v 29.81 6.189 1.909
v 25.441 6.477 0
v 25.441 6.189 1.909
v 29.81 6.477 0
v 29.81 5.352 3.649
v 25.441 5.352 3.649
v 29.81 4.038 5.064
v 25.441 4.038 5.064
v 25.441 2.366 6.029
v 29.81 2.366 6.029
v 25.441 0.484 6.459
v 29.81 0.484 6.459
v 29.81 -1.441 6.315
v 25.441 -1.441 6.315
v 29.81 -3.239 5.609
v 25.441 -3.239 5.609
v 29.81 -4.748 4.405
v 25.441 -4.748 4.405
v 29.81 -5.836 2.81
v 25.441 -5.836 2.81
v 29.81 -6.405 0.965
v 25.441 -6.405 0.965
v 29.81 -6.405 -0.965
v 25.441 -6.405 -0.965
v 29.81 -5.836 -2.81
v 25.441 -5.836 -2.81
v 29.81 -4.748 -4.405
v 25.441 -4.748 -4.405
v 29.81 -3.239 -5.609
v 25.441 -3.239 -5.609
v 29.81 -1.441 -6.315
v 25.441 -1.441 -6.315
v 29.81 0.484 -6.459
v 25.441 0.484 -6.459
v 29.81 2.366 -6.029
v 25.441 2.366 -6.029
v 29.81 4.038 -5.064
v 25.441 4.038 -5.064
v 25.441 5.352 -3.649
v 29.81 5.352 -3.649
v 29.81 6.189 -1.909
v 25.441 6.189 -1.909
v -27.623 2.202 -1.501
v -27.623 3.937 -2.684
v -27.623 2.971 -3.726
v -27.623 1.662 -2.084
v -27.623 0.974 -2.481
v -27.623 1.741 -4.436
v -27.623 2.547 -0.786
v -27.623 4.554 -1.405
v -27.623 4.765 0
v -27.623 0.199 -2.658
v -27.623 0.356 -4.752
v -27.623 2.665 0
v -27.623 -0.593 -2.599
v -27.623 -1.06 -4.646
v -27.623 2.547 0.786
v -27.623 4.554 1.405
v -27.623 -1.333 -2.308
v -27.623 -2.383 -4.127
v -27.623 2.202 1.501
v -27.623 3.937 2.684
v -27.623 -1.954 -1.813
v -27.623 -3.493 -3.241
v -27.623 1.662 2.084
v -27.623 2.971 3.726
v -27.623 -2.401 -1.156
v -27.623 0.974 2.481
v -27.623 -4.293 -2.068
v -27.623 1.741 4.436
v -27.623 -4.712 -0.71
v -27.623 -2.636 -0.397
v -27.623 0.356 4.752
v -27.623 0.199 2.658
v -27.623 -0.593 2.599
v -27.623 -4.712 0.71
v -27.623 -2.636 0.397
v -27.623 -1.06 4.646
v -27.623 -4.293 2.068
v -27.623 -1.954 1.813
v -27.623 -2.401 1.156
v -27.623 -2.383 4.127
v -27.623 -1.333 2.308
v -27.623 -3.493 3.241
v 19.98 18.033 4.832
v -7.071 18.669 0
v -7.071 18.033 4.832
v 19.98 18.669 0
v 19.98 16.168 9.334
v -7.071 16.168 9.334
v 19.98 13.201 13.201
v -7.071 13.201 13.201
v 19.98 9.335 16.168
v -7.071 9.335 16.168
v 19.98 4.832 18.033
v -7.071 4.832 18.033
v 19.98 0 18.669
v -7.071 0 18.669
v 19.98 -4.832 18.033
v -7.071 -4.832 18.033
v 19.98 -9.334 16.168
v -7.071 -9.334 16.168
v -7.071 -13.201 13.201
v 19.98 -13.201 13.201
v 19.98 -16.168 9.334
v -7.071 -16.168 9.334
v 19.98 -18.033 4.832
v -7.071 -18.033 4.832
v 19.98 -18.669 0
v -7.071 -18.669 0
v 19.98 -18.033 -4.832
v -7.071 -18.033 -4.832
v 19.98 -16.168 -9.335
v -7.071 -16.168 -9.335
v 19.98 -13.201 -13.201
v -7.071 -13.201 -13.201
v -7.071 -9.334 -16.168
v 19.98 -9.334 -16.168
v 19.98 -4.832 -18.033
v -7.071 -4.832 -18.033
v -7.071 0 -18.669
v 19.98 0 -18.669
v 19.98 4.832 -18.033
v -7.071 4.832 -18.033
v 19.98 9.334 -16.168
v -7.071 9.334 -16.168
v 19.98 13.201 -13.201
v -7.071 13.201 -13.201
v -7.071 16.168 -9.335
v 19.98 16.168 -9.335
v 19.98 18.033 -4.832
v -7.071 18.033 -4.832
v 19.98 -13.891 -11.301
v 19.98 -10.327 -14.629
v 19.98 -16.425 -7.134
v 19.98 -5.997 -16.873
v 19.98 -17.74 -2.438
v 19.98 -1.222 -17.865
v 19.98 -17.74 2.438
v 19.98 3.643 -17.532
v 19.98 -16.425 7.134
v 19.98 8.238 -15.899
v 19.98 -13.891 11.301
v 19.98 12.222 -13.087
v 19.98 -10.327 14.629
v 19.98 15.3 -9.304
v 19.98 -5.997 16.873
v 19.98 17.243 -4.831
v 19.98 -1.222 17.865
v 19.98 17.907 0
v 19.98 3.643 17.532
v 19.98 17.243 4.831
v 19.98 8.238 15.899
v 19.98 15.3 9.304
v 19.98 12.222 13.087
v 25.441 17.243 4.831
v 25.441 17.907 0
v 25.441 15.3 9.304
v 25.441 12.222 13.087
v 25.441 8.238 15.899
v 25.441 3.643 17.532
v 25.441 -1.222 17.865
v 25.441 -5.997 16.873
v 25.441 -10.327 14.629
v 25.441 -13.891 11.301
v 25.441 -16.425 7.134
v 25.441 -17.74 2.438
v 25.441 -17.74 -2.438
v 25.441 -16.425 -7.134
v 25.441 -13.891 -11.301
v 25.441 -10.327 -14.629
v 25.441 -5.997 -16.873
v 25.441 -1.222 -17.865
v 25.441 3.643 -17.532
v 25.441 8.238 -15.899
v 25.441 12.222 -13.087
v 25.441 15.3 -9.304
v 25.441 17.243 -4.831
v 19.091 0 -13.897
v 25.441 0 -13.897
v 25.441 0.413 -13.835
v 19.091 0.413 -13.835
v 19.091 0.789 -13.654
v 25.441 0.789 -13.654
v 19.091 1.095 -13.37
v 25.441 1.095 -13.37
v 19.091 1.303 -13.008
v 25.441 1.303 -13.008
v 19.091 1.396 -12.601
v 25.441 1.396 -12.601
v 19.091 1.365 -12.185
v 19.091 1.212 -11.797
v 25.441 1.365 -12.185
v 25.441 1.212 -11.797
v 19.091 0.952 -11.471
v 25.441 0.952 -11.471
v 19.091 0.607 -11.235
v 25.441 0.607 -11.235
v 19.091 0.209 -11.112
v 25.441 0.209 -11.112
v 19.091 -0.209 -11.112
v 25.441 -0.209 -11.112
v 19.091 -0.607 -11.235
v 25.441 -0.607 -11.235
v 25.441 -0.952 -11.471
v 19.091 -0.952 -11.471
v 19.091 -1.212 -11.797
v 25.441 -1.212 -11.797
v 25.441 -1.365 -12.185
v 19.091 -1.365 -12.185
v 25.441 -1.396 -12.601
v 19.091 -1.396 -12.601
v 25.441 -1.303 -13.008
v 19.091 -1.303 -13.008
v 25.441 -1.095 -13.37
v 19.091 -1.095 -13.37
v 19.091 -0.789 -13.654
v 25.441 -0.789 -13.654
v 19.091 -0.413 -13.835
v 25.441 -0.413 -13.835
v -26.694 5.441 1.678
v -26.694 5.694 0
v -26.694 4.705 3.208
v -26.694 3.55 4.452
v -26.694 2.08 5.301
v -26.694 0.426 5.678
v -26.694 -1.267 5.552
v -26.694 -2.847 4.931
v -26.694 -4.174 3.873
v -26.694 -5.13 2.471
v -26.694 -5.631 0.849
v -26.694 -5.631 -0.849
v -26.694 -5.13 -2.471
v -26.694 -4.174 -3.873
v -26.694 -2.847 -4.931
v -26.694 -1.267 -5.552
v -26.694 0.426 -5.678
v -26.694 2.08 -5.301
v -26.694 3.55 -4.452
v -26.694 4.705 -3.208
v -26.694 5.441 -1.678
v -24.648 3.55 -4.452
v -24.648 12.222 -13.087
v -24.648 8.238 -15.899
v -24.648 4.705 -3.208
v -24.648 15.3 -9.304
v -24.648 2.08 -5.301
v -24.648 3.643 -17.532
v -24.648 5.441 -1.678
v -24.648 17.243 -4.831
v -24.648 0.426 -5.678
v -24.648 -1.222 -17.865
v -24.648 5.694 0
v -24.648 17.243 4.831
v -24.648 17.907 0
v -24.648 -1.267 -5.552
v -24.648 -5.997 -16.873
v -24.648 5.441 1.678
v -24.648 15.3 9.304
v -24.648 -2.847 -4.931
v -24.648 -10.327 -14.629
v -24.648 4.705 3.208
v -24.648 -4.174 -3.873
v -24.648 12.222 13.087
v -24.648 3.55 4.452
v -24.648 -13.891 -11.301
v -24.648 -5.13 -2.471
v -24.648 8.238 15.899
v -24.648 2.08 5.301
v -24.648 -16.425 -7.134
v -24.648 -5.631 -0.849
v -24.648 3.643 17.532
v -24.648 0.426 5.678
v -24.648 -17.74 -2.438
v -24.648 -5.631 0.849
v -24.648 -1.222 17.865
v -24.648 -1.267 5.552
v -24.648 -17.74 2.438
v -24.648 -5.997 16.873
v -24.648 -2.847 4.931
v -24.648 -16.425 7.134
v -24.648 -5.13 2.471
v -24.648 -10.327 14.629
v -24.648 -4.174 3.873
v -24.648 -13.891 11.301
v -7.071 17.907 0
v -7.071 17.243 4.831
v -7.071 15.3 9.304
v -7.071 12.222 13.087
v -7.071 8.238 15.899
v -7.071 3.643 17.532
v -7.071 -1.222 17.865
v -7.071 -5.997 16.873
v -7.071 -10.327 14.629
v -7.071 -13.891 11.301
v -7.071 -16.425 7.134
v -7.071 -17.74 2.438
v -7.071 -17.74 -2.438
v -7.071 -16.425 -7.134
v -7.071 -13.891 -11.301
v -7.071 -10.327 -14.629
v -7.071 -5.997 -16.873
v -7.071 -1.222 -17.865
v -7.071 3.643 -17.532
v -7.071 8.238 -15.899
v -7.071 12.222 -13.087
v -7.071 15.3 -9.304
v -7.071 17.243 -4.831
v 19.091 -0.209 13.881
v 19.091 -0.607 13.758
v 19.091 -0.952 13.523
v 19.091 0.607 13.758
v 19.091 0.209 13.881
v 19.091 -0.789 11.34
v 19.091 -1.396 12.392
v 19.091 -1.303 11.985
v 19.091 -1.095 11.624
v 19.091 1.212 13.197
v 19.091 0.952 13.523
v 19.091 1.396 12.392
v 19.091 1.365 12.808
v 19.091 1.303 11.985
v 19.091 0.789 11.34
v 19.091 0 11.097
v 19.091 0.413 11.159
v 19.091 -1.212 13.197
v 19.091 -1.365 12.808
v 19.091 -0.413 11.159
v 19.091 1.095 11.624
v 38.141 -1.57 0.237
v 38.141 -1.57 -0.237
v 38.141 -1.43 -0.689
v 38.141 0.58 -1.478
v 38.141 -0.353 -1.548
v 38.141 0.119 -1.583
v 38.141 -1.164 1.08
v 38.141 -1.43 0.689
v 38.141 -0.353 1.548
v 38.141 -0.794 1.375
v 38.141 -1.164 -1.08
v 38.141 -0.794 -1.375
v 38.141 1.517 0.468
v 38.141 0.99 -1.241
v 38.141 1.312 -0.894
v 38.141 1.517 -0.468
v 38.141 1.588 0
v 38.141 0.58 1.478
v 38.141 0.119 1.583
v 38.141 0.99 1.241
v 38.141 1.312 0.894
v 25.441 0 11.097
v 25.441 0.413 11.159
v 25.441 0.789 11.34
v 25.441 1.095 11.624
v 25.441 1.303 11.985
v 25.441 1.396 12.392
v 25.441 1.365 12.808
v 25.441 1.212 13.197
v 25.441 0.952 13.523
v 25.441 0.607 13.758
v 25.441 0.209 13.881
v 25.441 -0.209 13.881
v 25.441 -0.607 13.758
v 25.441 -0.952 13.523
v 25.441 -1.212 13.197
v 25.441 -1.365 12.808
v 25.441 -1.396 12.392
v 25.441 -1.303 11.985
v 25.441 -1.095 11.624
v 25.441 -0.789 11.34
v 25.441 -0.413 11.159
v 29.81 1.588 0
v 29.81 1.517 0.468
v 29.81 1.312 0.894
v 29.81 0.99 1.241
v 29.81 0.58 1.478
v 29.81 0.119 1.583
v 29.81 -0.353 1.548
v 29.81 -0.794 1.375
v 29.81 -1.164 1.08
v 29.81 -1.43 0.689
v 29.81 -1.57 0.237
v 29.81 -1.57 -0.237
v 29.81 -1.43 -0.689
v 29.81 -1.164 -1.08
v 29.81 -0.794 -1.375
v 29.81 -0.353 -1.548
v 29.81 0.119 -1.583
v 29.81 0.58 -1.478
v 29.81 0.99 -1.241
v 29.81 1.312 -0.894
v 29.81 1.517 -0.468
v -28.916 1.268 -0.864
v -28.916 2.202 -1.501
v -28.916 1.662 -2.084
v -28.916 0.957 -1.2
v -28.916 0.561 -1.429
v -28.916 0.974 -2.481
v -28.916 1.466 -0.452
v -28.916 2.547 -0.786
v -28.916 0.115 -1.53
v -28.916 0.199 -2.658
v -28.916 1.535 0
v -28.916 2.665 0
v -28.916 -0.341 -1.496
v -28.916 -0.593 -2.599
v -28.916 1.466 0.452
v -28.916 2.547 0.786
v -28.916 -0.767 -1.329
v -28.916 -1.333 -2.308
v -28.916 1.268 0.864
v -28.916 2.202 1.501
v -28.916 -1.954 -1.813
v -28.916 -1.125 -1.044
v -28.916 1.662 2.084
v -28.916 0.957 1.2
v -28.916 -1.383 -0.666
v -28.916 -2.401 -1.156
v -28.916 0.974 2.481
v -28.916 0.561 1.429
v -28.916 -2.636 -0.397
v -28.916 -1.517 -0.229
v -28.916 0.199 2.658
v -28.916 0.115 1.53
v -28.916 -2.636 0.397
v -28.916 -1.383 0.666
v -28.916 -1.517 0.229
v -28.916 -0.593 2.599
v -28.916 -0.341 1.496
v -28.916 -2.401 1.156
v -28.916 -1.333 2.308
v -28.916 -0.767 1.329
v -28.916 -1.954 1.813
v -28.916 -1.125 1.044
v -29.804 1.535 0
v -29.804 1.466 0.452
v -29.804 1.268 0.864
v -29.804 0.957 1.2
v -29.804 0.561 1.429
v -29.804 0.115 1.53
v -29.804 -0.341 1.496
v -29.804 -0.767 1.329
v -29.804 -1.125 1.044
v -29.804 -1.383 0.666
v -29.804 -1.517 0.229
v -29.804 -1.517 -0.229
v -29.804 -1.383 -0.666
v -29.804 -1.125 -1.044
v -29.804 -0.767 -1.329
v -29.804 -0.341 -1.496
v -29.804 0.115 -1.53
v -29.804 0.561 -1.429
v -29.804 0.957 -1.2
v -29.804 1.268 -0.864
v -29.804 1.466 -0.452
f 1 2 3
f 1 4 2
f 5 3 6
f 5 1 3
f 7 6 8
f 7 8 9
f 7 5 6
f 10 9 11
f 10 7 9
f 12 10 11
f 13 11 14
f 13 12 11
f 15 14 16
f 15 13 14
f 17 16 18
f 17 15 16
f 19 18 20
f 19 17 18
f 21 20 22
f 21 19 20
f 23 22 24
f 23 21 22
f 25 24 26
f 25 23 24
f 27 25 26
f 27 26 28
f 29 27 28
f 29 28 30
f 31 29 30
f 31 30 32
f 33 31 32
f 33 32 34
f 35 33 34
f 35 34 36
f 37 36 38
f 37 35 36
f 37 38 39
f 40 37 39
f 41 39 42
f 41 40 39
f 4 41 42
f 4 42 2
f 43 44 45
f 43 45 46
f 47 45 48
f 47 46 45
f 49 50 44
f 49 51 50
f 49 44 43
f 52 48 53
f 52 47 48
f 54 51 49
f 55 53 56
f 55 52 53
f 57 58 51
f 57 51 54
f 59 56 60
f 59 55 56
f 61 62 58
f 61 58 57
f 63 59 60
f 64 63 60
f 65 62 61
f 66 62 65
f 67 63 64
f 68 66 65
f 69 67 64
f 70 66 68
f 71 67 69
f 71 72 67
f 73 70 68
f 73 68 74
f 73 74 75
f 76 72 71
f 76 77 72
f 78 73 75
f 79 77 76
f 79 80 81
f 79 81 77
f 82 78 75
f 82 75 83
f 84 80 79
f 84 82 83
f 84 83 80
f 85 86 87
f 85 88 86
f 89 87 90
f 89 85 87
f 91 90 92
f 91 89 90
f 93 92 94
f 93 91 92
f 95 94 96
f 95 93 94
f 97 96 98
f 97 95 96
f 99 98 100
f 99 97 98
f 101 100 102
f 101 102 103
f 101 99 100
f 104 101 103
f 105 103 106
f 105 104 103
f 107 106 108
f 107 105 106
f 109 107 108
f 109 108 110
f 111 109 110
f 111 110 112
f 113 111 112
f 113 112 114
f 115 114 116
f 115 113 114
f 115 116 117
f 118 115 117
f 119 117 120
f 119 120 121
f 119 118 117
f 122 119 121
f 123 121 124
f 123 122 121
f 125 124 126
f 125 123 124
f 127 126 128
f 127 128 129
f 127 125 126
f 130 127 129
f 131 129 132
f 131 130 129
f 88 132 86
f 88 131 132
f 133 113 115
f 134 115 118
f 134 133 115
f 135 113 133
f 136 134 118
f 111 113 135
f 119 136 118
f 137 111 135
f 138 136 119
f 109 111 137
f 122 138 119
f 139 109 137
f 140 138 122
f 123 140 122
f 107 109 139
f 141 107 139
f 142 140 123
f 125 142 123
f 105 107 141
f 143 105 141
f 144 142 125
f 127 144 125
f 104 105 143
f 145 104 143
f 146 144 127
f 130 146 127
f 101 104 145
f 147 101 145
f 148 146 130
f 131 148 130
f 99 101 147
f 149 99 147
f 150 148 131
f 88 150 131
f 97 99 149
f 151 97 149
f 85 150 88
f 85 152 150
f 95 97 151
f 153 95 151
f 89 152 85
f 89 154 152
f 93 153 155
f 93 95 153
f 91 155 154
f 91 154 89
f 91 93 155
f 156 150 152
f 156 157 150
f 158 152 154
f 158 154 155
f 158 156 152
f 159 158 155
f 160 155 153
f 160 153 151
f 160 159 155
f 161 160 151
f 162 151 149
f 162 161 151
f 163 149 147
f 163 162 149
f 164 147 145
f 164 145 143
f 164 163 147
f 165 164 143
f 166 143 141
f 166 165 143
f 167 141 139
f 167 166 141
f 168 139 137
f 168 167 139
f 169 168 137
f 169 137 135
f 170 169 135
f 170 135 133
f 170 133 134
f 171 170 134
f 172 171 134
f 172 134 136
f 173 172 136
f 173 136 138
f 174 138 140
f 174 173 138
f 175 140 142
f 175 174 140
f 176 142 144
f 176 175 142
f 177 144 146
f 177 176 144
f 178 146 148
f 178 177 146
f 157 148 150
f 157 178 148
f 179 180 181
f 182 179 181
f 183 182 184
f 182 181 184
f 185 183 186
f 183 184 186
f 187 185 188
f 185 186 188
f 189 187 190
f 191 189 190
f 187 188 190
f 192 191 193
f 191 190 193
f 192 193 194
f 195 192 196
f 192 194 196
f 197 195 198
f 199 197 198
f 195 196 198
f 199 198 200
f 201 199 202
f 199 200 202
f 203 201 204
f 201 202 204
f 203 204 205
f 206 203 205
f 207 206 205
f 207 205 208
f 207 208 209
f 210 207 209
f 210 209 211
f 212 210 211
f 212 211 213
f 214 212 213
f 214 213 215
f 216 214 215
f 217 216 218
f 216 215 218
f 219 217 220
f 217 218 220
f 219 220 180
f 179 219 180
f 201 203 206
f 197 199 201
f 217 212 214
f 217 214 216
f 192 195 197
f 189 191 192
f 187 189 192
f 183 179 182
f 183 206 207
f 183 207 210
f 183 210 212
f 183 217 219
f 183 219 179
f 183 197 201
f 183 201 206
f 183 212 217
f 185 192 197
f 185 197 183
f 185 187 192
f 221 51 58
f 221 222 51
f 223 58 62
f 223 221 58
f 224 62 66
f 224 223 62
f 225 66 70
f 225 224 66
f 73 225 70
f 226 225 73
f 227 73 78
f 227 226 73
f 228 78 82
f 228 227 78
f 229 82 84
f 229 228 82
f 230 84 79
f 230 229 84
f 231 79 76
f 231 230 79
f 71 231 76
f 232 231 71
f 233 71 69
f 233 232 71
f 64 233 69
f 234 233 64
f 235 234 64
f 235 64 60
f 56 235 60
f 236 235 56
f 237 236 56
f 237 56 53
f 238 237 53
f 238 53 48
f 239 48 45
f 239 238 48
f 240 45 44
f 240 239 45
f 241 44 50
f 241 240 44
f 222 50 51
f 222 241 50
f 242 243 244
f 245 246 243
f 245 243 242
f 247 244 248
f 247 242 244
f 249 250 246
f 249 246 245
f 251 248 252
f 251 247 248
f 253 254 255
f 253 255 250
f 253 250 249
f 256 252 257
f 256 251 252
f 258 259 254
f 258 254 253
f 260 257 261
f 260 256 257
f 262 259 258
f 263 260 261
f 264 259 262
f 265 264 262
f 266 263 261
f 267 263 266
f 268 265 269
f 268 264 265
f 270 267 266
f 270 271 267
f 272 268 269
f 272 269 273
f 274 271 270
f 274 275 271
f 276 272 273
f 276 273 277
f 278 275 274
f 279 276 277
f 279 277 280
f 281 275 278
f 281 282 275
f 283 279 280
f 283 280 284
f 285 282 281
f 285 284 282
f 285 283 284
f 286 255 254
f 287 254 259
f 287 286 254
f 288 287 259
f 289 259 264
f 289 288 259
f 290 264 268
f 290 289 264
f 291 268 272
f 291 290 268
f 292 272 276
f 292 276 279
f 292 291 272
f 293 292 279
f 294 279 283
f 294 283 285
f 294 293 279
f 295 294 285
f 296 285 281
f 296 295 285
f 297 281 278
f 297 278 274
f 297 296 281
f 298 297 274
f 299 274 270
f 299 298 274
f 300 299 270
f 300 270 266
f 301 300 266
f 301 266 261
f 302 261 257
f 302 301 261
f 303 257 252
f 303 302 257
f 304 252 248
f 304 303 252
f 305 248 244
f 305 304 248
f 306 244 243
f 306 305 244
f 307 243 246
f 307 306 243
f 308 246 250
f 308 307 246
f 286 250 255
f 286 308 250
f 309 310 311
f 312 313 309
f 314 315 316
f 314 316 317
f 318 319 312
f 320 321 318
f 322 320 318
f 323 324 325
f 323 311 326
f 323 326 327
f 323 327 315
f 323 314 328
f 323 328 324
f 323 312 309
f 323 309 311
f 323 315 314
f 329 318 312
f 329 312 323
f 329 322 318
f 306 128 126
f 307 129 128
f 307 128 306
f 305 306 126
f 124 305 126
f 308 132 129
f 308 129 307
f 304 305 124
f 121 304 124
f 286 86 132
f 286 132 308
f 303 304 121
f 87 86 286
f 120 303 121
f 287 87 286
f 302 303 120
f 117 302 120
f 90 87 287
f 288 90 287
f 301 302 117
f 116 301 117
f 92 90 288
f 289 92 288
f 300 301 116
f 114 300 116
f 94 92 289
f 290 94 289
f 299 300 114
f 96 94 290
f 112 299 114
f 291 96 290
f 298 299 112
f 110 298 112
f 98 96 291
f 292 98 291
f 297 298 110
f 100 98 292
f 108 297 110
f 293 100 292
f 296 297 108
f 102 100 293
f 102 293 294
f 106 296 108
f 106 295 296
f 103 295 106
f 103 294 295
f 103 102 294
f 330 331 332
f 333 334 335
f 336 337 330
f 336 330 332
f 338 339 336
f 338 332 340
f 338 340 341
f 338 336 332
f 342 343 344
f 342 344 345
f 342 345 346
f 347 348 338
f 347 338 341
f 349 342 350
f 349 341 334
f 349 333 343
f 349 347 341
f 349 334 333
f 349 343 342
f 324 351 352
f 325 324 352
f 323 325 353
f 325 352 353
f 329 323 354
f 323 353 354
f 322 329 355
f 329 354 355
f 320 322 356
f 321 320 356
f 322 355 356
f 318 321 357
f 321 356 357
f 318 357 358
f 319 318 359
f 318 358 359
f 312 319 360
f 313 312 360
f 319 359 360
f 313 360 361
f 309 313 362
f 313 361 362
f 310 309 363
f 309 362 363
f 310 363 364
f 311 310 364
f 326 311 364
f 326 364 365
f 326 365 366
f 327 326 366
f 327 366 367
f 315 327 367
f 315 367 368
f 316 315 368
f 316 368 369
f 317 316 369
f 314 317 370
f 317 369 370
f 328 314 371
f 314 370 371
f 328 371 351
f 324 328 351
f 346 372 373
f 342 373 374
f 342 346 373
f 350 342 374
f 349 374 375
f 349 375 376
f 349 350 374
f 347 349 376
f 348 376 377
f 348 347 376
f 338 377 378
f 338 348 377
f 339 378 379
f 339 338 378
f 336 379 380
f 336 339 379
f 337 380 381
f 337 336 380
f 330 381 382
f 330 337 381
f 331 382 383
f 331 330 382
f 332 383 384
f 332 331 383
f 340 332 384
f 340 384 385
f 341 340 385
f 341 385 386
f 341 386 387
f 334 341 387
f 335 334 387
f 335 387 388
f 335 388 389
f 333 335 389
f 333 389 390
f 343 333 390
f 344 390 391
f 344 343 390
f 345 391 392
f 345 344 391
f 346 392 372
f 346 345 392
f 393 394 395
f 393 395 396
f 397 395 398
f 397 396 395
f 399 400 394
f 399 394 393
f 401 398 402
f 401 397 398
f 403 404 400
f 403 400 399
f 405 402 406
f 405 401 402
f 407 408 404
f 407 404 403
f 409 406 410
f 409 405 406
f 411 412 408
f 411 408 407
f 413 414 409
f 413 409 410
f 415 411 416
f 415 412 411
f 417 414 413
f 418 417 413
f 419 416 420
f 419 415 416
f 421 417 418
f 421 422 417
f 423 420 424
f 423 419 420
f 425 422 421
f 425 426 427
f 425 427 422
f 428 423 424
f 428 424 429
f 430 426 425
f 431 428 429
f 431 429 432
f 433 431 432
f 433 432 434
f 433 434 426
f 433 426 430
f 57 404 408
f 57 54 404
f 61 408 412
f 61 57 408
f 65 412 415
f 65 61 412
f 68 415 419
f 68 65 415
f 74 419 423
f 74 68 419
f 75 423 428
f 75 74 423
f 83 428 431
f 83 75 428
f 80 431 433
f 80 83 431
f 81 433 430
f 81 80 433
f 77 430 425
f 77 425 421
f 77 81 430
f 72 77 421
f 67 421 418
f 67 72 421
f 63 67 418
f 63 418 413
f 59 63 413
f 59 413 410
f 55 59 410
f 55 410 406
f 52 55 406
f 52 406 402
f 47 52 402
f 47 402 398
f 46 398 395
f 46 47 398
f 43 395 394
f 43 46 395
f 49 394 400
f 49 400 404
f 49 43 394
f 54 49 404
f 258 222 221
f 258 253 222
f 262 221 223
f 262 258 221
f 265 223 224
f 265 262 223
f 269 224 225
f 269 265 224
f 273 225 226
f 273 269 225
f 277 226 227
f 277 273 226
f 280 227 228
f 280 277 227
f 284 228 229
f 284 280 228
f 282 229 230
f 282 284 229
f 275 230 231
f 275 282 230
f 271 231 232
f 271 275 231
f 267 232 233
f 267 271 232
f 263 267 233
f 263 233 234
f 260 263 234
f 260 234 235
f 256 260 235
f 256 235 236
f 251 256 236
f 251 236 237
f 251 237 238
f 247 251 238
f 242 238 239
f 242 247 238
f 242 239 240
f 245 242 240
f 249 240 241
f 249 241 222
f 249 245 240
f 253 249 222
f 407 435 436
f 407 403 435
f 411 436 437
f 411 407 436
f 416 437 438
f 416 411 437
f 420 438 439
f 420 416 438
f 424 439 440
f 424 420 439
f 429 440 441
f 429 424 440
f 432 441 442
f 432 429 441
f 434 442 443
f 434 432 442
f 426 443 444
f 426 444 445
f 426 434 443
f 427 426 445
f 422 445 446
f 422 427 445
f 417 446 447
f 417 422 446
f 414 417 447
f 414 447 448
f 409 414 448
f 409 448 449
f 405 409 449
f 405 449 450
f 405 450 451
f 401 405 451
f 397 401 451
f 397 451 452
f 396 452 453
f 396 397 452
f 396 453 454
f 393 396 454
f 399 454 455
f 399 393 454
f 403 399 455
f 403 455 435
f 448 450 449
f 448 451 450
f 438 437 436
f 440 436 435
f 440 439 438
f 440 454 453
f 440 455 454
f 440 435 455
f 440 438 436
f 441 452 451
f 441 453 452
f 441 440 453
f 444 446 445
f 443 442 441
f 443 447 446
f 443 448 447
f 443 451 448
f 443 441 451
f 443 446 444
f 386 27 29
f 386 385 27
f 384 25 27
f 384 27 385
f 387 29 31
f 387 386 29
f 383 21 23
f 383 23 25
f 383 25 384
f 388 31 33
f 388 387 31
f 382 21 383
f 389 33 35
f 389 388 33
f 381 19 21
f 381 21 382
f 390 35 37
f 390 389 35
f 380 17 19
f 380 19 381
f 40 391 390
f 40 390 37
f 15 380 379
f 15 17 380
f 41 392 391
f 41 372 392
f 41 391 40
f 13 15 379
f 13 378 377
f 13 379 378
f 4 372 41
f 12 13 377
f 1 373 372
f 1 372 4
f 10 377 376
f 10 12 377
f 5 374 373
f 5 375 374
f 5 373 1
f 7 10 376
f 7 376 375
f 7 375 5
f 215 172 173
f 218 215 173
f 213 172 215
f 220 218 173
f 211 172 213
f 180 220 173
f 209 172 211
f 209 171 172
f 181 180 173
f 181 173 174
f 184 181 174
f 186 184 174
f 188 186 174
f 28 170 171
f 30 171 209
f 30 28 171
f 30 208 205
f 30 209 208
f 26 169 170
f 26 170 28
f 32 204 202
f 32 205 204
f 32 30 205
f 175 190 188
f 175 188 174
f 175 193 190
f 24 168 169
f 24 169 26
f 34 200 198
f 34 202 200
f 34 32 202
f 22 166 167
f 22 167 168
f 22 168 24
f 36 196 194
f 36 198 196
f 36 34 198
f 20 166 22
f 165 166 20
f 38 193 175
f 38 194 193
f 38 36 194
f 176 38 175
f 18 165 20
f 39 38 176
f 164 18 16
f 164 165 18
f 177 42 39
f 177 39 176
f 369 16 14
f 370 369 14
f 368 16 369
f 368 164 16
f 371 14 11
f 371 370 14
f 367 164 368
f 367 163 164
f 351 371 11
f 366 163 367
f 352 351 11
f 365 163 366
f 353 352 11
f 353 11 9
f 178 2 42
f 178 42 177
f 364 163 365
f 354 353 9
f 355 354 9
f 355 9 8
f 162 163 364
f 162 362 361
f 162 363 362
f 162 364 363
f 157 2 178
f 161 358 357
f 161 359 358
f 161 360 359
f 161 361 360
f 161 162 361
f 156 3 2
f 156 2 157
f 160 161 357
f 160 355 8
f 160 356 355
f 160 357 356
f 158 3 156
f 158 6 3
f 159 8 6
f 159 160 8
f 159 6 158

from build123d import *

# Parameters (mm, degrees)
SKETCH2_R          = 1.4
CUT_EXTRUDE1_DEPTH = 6.35


with BuildPart() as part:
    # Sketch1 → Revolve1 (revolve)
    with BuildSketch(Plane.XY):
        Polygon((-29.804083682, 0), (-29.804083682, 1.534627615), (-28.915615063, 1.534627615), (-28.915615063, 2.665405858), (-27.623297071, 2.665405858), (-27.623297071, 4.765422594), (-26.694443515, 5.694276151), (-24.647883682, 5.694276151), (-24.647883682, 17.907), (-7.071083682, 17.907), (-7.071083682, 18.669), (19.979916318, 18.669), (19.979916318, 17.907), (25.440916318, 17.907), (25.440916318, 6.477), (29.809716318, 6.477), (29.809716318, 1.5875), (38.140916318, 1.5875), (38.140916318, 0), align=None)
    revolve(axis=Axis((-37.638761506, 0, 0), (1, 0, 0)))

    # Sketch2 → Cut-Extrude1 (cut)
    with BuildSketch(Plane(origin=(25.440916318, 0, 0), x_dir=(0, 0, -1), z_dir=(1, 0, 0))):
        with Locations((-12.4968, 0)):
            Circle(SKETCH2_R)
        with Locations((12.4968, 0)):
            Circle(SKETCH2_R)
    extrude(amount=-CUT_EXTRUDE1_DEPTH, mode=Mode.SUBTRACT)


solid = part.part
